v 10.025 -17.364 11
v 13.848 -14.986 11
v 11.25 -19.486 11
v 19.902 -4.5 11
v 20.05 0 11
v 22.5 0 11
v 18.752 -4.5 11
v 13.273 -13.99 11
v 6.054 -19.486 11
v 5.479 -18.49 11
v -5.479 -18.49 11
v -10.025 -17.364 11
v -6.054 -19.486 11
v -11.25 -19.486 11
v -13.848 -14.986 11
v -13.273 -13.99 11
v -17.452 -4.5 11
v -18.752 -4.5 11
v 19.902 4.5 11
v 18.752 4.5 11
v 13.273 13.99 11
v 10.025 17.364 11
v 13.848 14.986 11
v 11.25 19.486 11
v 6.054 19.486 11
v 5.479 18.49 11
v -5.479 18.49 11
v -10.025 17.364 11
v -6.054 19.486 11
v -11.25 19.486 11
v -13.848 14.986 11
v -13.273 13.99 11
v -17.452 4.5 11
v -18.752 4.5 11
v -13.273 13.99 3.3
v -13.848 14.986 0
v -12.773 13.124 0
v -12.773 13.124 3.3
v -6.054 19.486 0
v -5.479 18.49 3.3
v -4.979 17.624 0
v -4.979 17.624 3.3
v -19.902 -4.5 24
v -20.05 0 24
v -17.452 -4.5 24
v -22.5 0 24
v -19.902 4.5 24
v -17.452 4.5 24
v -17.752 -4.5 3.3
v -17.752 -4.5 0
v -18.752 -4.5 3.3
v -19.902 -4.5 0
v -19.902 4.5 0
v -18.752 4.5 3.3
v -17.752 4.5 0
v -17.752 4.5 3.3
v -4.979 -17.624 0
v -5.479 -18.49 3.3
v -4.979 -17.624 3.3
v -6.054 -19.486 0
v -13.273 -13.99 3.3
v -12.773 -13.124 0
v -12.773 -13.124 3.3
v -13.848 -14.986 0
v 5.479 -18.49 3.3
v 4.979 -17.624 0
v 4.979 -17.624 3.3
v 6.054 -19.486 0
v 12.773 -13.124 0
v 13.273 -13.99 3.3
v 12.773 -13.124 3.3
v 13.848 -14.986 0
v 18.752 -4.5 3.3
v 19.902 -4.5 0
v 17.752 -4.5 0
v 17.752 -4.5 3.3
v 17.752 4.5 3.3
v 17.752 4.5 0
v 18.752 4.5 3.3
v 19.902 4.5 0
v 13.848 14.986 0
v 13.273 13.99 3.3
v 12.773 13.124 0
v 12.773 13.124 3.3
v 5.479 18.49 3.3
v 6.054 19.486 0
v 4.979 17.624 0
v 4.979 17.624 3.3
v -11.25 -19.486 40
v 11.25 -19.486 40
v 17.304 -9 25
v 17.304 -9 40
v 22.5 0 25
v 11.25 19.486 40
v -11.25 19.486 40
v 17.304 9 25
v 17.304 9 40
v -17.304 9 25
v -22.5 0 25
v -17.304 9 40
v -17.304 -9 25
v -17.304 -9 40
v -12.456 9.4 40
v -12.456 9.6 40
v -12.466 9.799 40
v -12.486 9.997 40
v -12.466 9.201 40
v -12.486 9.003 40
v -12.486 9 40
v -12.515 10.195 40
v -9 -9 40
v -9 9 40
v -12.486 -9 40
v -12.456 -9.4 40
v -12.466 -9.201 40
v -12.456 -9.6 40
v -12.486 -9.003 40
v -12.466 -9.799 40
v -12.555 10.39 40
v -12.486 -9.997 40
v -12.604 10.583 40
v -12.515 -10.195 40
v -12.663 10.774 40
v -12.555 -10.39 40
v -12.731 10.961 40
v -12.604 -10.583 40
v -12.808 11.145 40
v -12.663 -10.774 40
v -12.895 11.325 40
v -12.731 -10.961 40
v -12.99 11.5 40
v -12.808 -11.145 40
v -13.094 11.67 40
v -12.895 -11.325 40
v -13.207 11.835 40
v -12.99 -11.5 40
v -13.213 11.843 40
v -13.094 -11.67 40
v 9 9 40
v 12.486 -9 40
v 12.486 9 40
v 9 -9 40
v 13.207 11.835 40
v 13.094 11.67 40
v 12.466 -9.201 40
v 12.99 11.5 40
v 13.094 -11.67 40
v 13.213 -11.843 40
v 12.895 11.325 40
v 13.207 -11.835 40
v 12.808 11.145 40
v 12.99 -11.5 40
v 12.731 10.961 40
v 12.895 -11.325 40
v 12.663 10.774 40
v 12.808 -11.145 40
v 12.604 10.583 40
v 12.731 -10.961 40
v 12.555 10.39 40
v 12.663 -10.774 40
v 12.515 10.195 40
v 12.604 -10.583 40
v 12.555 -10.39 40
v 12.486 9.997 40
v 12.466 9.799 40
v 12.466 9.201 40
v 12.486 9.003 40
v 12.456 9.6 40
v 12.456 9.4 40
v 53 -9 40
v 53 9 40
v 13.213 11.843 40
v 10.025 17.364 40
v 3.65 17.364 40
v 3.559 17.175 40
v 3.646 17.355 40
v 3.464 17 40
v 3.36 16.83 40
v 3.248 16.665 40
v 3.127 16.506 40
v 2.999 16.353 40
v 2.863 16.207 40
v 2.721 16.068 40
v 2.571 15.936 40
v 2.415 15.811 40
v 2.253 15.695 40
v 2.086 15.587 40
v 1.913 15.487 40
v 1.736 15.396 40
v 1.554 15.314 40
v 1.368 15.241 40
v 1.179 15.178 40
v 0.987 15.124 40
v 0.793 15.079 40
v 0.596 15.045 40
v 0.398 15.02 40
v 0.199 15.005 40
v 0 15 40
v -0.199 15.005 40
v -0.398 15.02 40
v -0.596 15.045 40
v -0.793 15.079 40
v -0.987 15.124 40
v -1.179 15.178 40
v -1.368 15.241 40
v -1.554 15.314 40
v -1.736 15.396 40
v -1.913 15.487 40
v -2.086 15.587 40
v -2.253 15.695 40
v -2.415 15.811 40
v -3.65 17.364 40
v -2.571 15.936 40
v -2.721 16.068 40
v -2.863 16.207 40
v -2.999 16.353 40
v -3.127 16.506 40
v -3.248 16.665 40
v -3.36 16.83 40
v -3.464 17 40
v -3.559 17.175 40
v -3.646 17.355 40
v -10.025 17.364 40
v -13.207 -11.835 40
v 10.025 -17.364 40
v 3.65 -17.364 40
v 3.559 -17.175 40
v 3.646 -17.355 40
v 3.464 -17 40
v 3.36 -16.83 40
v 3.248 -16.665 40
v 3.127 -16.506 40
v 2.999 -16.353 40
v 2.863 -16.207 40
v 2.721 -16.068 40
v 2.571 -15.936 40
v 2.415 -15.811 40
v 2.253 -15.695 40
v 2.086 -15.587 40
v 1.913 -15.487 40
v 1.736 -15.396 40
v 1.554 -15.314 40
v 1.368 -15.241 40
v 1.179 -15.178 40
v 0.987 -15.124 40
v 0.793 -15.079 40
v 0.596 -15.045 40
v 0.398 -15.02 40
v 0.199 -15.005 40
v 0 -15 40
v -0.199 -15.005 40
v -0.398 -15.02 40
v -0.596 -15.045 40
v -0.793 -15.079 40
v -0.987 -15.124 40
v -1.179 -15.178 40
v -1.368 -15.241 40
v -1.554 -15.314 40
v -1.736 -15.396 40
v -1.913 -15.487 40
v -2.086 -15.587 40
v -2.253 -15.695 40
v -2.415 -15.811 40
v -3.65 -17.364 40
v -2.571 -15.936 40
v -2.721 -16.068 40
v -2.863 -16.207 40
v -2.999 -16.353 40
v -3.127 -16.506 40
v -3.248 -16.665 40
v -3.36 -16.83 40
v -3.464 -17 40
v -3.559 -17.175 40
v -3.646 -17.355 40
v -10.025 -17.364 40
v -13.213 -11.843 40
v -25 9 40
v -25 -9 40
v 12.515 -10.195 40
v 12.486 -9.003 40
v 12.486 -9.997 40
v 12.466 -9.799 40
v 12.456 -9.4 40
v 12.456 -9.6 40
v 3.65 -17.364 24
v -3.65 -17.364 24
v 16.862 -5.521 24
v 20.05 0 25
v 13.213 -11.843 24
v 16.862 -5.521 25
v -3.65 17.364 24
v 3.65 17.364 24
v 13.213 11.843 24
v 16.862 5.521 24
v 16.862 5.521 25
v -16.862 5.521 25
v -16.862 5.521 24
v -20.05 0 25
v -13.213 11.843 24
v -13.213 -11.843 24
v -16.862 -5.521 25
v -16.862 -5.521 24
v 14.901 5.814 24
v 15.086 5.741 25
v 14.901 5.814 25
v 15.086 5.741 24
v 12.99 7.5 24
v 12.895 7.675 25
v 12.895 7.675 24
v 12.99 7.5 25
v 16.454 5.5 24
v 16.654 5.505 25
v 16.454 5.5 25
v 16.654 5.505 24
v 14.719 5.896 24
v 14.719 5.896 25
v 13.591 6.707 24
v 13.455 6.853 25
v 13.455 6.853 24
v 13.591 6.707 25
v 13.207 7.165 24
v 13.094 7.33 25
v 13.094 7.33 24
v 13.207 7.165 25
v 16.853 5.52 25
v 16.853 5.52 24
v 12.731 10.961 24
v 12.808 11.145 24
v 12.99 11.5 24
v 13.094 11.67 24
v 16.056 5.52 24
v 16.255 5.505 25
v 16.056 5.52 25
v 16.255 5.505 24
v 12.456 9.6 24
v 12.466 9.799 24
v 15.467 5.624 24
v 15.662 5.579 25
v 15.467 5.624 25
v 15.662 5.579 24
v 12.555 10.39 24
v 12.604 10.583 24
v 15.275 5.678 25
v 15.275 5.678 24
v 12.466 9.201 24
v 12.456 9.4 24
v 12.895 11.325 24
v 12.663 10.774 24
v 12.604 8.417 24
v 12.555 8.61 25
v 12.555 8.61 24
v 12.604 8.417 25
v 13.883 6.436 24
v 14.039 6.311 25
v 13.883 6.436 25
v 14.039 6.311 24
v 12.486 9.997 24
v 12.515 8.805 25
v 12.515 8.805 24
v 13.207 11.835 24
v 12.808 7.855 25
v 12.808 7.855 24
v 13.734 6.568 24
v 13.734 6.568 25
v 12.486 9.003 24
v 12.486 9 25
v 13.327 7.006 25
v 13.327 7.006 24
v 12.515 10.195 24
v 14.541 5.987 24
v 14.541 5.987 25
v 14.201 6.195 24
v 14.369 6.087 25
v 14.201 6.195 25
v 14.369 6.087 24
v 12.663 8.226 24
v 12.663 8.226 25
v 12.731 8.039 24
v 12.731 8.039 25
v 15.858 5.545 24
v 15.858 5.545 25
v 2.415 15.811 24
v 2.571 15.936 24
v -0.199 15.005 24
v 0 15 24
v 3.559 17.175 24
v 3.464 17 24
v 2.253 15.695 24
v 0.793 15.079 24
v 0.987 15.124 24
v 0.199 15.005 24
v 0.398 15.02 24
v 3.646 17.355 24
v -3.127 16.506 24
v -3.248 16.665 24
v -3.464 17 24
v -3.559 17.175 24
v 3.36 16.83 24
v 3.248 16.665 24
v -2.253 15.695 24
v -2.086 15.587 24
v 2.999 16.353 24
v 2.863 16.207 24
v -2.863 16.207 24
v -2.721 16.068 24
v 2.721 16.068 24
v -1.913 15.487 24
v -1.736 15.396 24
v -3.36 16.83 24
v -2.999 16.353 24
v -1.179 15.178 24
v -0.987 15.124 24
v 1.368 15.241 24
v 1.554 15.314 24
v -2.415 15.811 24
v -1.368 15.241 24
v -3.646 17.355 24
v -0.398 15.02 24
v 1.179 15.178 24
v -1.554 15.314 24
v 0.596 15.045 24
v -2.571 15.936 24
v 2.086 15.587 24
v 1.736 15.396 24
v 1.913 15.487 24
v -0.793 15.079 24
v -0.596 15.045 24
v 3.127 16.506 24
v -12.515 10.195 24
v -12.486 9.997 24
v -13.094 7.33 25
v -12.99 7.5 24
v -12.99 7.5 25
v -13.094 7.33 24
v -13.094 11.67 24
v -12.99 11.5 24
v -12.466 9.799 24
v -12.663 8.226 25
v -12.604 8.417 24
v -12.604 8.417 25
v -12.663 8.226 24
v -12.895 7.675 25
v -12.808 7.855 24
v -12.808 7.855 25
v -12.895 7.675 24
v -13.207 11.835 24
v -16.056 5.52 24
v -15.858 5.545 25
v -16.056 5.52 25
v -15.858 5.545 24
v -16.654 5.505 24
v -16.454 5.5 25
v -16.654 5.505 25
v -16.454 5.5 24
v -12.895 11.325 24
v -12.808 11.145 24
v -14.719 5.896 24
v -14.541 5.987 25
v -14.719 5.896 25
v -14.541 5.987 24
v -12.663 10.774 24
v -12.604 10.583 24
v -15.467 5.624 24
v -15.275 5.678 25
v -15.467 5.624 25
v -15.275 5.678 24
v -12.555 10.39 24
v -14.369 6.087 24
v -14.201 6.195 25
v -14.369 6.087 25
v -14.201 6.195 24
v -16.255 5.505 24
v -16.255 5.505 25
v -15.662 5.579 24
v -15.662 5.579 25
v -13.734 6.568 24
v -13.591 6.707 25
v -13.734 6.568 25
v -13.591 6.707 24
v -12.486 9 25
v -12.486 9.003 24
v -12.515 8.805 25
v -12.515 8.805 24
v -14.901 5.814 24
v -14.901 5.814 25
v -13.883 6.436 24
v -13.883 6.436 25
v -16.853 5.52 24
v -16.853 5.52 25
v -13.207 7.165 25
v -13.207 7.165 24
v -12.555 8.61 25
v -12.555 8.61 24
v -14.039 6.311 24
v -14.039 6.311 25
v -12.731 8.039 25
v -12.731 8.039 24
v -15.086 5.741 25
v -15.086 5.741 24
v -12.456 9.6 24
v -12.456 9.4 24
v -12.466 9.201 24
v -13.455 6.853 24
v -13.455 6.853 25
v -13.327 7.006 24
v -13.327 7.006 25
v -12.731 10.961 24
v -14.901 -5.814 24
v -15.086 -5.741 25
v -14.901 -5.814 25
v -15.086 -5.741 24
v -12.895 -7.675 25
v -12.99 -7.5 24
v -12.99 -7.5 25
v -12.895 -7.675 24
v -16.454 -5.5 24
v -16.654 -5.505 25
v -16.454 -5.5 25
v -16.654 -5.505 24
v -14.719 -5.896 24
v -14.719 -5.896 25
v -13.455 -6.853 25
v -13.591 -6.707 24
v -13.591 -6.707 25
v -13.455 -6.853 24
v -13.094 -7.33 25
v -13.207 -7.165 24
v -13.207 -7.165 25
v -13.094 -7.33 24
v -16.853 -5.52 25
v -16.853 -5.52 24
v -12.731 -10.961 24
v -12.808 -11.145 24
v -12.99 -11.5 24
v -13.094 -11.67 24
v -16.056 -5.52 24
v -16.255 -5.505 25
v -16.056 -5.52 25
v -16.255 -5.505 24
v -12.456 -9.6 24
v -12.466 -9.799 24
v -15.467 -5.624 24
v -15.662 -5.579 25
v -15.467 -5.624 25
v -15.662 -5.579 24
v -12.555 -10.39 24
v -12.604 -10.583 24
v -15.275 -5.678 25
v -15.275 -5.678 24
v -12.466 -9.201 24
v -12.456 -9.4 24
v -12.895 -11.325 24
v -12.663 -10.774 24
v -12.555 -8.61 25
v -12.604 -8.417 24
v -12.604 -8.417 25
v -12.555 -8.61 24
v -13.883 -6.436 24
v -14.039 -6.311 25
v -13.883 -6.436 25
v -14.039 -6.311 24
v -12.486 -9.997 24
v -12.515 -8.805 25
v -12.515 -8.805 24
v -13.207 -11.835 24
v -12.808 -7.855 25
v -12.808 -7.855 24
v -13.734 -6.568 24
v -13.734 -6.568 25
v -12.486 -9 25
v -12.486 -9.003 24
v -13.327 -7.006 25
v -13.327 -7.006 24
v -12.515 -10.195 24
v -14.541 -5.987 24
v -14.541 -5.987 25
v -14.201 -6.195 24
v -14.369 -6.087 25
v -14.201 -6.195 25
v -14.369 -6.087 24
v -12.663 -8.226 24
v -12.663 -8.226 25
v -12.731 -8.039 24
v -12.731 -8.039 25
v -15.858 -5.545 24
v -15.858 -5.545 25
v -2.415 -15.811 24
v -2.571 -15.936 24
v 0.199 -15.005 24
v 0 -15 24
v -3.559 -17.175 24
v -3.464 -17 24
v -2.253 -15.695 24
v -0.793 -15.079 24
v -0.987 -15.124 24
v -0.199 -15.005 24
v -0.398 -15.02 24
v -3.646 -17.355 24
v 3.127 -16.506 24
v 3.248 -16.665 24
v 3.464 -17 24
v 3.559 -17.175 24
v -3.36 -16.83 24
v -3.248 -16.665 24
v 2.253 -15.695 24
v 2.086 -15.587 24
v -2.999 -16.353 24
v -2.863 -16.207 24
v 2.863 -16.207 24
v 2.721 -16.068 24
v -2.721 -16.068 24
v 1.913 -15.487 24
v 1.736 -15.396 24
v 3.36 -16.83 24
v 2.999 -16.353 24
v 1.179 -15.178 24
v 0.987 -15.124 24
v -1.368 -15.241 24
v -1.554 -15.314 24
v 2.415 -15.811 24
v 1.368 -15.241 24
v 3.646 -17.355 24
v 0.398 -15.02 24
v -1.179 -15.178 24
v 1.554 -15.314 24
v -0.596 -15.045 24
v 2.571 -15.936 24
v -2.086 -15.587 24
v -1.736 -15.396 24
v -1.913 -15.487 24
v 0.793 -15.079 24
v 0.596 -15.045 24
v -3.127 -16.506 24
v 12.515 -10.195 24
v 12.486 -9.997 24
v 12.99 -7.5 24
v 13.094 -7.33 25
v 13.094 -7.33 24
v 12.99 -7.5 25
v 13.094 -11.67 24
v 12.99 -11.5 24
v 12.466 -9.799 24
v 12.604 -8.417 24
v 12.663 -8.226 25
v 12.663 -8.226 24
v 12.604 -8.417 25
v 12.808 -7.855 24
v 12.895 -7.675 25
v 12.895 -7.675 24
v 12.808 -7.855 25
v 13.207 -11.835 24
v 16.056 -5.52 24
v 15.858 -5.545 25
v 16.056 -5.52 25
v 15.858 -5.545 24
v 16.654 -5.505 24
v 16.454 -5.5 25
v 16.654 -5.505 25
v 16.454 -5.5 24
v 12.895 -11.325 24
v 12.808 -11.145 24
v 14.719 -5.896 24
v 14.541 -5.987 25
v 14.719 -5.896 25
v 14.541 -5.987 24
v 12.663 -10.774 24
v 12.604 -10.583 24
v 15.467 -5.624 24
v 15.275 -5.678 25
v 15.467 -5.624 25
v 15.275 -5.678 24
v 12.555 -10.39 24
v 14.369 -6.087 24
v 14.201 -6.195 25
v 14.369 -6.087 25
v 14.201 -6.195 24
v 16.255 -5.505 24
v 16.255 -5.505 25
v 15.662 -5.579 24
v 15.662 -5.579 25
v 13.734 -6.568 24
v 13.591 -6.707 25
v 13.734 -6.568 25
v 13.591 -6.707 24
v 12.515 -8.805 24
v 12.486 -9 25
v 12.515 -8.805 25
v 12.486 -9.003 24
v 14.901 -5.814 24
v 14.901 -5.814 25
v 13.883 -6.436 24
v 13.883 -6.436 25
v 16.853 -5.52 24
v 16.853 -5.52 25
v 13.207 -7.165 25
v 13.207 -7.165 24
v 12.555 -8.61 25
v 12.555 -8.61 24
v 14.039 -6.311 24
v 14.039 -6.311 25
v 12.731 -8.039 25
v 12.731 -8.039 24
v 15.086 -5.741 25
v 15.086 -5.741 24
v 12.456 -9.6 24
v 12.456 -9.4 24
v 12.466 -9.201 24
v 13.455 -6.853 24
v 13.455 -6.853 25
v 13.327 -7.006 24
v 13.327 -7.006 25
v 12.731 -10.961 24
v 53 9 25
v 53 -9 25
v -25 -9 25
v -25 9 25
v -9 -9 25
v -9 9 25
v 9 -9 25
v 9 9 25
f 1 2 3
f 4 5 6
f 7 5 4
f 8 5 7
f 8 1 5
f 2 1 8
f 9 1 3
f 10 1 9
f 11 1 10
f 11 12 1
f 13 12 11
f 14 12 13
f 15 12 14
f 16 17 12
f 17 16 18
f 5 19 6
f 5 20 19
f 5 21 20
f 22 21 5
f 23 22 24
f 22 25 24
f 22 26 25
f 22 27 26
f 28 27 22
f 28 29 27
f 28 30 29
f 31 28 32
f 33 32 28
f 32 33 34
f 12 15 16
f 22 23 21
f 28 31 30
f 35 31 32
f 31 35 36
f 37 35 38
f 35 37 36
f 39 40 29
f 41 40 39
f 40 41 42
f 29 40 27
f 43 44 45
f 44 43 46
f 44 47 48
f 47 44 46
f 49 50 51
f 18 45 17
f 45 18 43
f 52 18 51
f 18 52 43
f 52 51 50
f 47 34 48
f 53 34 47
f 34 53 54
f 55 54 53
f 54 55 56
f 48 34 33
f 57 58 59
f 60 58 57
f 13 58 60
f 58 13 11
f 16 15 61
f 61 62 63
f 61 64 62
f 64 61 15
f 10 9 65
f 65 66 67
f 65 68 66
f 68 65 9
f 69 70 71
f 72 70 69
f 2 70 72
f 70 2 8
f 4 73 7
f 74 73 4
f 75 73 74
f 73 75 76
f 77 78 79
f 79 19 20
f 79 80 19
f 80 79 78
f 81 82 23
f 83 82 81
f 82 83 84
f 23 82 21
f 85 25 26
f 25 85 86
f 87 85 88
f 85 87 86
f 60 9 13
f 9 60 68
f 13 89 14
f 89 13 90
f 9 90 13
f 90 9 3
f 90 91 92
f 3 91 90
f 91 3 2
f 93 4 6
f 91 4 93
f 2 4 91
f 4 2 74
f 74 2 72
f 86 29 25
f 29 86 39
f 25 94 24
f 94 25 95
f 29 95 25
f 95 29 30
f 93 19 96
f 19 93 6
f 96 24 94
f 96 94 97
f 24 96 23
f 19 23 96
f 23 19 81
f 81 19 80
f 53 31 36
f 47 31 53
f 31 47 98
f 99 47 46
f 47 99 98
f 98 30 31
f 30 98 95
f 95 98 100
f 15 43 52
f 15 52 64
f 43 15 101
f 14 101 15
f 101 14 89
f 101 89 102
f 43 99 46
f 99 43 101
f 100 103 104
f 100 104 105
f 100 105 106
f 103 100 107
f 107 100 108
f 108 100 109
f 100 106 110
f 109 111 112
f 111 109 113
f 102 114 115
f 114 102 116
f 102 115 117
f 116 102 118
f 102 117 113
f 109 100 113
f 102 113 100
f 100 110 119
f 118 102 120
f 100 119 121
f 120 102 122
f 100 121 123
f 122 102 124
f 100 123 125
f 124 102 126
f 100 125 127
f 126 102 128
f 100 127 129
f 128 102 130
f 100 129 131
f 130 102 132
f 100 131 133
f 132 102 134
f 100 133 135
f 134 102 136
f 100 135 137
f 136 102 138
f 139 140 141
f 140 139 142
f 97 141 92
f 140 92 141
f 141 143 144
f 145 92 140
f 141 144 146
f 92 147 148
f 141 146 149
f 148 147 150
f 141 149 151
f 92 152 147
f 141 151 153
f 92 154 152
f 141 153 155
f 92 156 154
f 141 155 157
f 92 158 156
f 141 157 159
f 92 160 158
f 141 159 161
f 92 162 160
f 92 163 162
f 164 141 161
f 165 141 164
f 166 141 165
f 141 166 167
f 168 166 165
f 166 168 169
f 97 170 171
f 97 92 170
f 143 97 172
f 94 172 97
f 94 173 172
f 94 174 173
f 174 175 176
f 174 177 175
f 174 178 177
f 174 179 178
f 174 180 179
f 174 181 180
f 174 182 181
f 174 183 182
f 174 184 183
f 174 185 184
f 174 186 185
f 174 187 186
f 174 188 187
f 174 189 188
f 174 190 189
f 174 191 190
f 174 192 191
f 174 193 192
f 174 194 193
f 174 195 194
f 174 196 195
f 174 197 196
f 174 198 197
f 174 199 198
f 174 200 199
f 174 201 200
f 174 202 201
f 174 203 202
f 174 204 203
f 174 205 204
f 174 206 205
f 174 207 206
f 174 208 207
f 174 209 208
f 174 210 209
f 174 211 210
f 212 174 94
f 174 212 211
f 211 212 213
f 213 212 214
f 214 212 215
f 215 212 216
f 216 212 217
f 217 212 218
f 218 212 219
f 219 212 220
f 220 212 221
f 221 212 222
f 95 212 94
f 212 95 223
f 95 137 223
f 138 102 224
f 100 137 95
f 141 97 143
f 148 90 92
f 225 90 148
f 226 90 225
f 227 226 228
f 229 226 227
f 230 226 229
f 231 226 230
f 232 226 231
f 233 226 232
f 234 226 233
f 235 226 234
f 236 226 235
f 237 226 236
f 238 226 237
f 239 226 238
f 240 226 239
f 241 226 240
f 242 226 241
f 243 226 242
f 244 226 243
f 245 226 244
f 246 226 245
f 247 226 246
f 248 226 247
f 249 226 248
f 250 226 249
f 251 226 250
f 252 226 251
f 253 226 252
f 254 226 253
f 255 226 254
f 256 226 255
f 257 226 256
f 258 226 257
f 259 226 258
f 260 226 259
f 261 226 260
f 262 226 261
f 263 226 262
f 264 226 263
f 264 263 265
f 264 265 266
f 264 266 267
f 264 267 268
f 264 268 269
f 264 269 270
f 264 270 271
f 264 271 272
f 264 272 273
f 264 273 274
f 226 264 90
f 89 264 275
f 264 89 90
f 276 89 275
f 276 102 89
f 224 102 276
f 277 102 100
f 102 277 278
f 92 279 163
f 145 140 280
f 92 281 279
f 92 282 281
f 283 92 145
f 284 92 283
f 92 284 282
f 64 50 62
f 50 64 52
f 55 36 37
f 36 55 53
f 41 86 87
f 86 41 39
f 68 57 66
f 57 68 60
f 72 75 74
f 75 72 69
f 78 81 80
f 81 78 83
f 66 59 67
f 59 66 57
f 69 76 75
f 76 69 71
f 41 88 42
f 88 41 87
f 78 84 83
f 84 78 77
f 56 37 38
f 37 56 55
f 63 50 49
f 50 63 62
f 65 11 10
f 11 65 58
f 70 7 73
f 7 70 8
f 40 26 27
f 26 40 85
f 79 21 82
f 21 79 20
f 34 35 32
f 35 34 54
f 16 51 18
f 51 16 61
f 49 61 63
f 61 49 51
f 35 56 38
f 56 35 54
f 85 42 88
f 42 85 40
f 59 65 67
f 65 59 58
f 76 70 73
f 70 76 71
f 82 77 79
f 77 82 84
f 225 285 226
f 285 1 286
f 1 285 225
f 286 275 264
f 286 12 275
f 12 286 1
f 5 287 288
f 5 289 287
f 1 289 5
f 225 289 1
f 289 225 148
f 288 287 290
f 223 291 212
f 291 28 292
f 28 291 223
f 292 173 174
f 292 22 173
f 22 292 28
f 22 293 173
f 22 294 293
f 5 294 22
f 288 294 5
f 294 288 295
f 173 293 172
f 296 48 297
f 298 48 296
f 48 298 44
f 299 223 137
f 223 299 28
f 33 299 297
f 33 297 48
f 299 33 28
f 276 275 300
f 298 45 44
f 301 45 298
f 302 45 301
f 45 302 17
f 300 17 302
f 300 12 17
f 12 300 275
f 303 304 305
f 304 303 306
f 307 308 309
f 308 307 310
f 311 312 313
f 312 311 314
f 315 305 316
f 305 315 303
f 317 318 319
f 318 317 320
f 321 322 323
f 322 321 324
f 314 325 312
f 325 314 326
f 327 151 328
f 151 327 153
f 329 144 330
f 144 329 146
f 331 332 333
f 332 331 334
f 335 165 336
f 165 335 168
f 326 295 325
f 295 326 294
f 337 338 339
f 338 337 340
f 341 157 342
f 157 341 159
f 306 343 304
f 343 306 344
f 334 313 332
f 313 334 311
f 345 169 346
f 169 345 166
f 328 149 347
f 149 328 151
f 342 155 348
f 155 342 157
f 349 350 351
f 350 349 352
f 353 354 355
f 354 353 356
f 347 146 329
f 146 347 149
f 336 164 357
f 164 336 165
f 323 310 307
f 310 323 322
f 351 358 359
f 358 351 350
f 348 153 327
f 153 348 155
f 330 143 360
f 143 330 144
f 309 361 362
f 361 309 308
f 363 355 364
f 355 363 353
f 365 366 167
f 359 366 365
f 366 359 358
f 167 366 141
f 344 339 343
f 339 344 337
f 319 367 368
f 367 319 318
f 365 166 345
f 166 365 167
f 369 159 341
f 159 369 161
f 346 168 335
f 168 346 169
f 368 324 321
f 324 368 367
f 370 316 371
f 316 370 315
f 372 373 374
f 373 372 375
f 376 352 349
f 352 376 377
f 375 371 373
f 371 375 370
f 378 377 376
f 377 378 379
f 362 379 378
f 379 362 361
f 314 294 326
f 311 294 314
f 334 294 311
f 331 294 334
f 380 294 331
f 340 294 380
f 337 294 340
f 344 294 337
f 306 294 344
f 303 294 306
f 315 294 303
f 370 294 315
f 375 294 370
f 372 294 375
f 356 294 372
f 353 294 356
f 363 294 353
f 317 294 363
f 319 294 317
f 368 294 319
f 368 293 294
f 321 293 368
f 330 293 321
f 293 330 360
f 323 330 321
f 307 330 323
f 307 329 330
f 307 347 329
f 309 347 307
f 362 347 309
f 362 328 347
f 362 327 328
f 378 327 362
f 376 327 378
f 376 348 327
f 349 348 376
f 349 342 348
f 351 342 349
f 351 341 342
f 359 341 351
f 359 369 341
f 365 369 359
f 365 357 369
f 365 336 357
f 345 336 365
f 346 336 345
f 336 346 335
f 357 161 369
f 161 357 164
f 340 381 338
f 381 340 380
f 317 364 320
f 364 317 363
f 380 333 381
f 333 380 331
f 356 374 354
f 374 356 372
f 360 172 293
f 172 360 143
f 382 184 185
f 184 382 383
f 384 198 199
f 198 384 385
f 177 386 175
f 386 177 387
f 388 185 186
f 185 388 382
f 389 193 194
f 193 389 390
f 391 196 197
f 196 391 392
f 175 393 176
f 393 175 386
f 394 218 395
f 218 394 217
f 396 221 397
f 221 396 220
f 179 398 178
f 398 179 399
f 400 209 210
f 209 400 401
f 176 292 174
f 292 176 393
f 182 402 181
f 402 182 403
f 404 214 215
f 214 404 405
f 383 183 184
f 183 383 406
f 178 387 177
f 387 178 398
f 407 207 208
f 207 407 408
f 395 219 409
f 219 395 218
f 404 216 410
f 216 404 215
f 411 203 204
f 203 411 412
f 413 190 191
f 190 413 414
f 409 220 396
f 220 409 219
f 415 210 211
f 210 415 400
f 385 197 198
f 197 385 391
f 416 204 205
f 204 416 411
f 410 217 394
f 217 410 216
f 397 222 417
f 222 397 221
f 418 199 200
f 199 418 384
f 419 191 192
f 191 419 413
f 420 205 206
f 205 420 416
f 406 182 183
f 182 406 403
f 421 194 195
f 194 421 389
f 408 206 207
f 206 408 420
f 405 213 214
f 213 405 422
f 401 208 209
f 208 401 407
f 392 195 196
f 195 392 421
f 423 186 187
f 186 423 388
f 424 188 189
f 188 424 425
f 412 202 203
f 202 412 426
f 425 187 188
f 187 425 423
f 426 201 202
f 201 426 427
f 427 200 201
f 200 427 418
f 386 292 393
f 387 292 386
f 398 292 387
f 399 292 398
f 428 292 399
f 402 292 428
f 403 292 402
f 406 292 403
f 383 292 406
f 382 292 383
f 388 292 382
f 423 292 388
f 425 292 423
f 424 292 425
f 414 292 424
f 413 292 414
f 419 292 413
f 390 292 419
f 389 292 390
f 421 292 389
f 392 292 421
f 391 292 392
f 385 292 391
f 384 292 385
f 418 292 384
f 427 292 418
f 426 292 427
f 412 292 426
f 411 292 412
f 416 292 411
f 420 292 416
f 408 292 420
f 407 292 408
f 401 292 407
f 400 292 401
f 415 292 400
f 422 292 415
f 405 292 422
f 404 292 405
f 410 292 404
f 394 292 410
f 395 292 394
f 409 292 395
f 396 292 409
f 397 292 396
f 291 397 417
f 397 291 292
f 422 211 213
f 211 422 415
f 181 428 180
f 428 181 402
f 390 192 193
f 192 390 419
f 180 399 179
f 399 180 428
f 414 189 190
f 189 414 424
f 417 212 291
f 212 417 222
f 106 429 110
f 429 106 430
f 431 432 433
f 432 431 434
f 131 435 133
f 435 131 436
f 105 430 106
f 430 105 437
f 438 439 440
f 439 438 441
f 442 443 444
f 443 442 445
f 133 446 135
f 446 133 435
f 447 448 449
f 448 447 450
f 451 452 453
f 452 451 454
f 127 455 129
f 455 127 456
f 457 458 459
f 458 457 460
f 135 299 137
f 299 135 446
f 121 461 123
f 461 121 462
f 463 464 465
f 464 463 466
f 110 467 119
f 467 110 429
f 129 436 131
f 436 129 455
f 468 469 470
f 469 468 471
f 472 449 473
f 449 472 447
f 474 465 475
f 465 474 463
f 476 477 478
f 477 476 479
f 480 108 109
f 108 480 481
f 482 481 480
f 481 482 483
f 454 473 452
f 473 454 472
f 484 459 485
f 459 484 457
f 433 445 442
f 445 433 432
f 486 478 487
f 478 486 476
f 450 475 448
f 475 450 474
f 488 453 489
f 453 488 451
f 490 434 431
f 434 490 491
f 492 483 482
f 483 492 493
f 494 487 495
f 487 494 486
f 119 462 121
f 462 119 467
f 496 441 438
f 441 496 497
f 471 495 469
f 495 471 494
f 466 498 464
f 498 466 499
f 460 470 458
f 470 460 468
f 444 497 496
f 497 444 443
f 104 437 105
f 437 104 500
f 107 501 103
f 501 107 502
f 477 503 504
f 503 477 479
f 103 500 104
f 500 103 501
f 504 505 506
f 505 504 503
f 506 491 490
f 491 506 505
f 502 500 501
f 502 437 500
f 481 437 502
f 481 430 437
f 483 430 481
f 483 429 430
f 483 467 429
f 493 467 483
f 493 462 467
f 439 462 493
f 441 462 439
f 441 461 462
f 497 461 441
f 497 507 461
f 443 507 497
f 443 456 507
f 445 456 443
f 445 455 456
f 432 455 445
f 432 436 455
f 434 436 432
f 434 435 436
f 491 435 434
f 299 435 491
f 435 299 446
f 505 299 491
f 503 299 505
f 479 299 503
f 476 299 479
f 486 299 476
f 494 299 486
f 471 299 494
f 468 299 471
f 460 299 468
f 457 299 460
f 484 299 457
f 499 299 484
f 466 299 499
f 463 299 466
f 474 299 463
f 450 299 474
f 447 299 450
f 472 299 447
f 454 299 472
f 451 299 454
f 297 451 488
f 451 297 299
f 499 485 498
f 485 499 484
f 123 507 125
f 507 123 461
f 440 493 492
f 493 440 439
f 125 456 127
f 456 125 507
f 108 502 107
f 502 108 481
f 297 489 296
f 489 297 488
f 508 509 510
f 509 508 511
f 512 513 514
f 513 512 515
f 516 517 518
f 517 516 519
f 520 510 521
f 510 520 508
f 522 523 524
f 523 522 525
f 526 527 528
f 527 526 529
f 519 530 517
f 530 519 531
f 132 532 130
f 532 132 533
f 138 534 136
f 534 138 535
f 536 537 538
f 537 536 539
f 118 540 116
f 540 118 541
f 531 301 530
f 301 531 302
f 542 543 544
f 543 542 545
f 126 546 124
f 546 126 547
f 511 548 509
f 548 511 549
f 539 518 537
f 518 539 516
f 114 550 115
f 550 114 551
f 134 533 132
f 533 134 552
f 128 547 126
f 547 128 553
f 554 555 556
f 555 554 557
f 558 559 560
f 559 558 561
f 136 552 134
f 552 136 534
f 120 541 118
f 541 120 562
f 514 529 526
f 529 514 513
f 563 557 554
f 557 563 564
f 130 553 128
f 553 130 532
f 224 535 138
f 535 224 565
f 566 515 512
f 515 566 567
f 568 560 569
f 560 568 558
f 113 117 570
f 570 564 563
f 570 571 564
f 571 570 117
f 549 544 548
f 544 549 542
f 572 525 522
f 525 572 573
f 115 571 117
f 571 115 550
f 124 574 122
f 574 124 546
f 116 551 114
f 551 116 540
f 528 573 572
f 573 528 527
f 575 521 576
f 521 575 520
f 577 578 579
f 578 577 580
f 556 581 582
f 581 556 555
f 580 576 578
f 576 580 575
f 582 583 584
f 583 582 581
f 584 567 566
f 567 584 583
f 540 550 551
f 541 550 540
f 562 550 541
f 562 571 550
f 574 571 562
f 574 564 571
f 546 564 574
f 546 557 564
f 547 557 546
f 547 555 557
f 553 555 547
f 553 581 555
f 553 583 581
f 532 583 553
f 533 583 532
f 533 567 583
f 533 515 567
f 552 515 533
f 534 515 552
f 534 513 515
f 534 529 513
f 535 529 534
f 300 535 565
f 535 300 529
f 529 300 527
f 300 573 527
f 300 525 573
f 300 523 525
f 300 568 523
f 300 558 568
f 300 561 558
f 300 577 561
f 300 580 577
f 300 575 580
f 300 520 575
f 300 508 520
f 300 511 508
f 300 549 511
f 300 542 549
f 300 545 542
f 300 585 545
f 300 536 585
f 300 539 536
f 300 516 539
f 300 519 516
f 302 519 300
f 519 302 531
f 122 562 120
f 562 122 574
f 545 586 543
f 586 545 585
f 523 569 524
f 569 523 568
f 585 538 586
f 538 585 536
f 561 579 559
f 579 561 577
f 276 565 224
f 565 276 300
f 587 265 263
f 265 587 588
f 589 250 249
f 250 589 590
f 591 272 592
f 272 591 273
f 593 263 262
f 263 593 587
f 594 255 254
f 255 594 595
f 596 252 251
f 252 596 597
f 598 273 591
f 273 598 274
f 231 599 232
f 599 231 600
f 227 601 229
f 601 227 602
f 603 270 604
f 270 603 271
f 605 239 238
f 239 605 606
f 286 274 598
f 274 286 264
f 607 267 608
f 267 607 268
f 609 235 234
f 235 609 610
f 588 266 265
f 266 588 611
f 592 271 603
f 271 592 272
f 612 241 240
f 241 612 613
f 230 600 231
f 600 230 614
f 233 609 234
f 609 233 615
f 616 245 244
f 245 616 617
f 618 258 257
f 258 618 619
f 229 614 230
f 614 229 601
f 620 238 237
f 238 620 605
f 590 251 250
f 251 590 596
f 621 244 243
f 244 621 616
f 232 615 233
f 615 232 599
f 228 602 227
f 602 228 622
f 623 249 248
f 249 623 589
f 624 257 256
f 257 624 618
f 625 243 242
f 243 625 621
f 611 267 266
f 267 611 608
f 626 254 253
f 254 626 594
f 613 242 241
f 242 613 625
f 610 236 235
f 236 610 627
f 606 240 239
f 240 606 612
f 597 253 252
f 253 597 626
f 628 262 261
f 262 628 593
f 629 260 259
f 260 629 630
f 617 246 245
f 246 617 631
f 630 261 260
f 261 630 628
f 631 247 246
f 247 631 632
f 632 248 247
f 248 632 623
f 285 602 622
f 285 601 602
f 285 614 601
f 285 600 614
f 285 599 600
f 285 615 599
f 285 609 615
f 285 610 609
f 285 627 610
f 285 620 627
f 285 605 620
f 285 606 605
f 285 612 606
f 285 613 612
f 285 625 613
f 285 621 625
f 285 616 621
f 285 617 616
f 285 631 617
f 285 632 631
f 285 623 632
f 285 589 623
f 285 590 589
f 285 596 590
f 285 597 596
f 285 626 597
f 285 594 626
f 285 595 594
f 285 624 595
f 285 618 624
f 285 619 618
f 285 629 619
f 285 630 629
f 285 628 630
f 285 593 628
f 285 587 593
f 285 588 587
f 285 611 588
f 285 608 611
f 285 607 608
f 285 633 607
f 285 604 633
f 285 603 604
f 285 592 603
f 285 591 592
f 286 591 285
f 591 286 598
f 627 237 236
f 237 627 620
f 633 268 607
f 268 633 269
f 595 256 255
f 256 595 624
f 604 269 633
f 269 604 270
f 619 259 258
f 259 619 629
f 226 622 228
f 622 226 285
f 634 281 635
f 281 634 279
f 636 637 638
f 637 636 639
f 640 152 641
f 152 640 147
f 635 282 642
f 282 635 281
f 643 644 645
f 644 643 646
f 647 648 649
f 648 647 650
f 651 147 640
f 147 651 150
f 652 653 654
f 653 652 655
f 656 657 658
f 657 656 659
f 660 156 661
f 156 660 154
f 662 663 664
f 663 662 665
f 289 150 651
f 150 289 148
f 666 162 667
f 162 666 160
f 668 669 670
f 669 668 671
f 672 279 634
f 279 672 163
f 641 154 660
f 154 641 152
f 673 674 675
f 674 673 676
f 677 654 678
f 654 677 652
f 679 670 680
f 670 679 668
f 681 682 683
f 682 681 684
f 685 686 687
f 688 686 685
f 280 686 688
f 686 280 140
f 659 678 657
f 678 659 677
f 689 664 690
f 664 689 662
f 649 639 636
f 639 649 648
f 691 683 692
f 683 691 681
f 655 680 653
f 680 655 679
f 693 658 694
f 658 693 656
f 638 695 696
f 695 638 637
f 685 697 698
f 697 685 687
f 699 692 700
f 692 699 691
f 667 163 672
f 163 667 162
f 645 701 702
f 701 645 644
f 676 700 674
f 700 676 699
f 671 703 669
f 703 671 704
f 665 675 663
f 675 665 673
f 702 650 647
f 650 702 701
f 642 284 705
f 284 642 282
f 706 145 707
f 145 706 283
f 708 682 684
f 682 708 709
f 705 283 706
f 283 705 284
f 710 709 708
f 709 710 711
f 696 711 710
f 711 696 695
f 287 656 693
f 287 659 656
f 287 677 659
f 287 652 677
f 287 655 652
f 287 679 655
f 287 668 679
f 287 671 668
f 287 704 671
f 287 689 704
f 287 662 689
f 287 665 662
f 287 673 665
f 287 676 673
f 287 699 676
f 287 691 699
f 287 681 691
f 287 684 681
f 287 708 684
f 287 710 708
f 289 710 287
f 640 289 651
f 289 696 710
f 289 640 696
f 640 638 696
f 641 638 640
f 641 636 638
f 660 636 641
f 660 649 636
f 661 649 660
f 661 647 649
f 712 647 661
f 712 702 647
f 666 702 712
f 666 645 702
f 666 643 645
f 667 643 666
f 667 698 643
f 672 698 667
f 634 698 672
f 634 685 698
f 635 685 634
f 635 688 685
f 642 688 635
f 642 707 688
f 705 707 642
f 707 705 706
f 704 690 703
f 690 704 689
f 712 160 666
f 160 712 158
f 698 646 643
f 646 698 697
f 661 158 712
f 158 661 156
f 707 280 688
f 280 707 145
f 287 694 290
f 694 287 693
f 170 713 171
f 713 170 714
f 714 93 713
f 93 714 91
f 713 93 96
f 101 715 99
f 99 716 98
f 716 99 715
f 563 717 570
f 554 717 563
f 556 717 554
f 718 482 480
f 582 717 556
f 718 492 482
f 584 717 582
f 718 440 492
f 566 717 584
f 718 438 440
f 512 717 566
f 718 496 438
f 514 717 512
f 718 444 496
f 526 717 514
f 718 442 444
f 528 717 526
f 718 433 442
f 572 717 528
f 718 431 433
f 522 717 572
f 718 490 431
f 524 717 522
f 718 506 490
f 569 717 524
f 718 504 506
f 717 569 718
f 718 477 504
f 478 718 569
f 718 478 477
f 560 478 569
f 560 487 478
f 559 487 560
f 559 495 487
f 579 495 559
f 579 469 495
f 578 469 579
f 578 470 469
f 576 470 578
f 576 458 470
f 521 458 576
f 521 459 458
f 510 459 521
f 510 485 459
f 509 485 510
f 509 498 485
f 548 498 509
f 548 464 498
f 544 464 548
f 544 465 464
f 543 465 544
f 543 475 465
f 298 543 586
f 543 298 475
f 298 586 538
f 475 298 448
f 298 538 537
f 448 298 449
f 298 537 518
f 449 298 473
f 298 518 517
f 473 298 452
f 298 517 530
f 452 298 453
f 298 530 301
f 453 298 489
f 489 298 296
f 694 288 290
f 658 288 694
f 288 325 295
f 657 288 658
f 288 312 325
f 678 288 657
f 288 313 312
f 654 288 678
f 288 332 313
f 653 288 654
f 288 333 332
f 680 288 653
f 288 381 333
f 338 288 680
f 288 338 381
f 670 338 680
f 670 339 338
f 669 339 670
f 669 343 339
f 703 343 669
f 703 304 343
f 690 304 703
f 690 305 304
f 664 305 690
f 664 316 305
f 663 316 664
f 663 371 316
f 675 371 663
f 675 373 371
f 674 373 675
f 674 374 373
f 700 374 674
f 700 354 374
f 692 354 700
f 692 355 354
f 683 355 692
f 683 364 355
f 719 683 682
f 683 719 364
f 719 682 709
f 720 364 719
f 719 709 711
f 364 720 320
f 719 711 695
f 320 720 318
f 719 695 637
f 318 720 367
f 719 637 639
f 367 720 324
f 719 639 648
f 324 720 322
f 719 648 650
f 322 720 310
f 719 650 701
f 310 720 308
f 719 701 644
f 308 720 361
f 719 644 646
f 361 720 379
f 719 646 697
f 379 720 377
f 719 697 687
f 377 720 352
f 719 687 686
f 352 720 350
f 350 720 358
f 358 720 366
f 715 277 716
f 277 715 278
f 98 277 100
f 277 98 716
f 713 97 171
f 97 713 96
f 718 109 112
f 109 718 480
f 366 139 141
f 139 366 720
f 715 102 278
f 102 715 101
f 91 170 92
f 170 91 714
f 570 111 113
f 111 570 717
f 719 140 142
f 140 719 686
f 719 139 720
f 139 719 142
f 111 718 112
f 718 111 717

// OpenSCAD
$fa=.1;
$fs=.2;

difference() {
    cylinder(h=40, d=45, $fn=6);

    cylinder(h=4, d=45-2.15*2, $fn=6);
    translate([0,0,3.3]) cylinder(h=7.7, d=45-1.15*2, $fn=6);
    translate([0,0,-1]) cylinder(h=42, d=45-2.45*2, $fn=6);
    for(i=[30:60:330]) rotate([0,0,i]) translate([-4.5,0,-1]) cube([9,50,i==90?25:12]);
    
    
}

translate([0,0,24]){
    for(i=[30:60:330]) rotate([0,0,i]) translate([19,0,0]) difference() {
        cylinder(h=16,d=8);
        translate([0,-10,-1]) cube(50);
    }
}

difference() {
    translate([-25,-9,25]) cube([78,18,15]);
    translate([-9,-9,24]) cube(18);
}
